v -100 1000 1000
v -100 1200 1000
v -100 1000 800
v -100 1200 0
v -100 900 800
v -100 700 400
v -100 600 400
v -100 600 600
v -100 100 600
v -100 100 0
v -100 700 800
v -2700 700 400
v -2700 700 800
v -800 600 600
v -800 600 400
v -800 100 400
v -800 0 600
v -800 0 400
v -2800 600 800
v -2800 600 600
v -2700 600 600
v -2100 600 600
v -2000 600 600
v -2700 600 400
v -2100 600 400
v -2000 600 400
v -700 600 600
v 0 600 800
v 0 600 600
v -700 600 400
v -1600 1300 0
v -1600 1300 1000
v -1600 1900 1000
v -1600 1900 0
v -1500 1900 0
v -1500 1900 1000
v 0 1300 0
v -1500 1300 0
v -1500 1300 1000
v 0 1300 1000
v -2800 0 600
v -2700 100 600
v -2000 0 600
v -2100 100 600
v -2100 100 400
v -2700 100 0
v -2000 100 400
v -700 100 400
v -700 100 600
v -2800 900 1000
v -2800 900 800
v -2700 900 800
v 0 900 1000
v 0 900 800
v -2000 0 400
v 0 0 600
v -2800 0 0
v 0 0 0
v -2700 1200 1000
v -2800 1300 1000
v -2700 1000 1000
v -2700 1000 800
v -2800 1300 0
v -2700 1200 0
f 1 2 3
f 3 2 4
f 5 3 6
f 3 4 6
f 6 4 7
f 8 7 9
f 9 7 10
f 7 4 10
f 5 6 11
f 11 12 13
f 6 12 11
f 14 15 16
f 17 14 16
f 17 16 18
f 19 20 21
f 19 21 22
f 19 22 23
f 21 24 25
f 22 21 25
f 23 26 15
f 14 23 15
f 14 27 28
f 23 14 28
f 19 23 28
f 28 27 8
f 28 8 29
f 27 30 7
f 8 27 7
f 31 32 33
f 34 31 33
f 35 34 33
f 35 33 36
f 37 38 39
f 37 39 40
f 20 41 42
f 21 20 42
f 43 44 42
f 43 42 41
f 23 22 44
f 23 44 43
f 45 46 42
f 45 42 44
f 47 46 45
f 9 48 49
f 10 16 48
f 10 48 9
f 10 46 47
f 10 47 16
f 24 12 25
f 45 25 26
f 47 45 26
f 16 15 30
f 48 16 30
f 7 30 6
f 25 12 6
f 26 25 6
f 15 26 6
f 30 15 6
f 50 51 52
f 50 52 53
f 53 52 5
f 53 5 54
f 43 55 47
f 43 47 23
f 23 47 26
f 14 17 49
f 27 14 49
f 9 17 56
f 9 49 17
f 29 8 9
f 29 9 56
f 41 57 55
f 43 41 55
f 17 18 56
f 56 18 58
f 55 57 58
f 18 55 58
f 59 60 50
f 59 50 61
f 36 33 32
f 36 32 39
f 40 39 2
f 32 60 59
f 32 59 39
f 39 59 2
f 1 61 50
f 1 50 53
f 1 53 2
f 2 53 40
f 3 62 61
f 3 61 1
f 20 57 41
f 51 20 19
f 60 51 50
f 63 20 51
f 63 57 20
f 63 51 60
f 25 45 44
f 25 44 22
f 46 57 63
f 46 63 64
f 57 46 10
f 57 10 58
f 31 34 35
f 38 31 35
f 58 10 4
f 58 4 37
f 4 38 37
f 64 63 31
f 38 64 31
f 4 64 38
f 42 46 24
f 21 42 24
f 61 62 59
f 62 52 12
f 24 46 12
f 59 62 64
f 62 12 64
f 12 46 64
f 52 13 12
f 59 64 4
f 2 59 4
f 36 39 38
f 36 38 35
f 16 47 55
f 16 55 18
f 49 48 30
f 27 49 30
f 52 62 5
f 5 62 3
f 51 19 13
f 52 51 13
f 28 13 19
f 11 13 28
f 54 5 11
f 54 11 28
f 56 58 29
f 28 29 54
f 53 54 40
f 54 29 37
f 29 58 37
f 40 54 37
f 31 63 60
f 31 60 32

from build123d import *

# Parameters (mm, degrees)
F0_W     = 2800
F0_H     = 1300
F0_W_2   = 2600
F0_H_2   = 1100
F1_DEPTH = 400
F2_W     = 2800
F2_H     = 700
F2_W_2   = 2600
F2_H_2   = 500
F3_DEPTH = 400
F4_W     = 2800
F4_H     = 400
F4_W_2   = 2600
F4_H_2   = 200
F5_DEPTH = 200
F6_W     = 100
F6_H     = 600
F7_DEPTH = 1000
F8_W     = 100
F8_H     = 500
F8_H_2   = 100
F8_W_2   = 600
F9_DEPTH = 200


with BuildPart() as f1:
    # F0 (on Top) → F1 (new body)
    with BuildSketch(Plane.XY):
        with Locations((-1400, 650)):
            Rectangle(F0_W, F0_H)
        with Locations((-1400, 650)):
            Rectangle(F0_W_2, F0_H_2, mode=Mode.SUBTRACT)
    extrude(amount=F1_DEPTH)

    # F2 (on face) → F3 (join)
    with BuildSketch(Plane.XY.offset(400)):
        with Locations((-1400, 950)):
            Rectangle(F2_W, F2_H)
        with Locations((-1400, 950)):
            Rectangle(F2_W_2, F2_H_2, mode=Mode.SUBTRACT)
    extrude(amount=F3_DEPTH)

    # F4 (on face) → F5 (join)
    with BuildSketch(Plane.XY.offset(800)):
        with Locations((-1400, 1100)):
            Rectangle(F4_W, F4_H)
        with Locations((-1400, 1100)):
            Rectangle(F4_W_2, F4_H_2, mode=Mode.SUBTRACT)
    extrude(amount=F5_DEPTH)

    # F6 (on Top) → F7 (join)
    with BuildSketch(Plane.XY):
        with Locations((-1550, 1600)):
            Rectangle(F6_W, F6_H)
    extrude(amount=F7_DEPTH)

    # F8 (on face) → F9 (join)
    with BuildSketch(Plane.XY.offset(400)):
        with Locations((-750, 350)):
            Rectangle(F8_W, F8_H)
        with Locations((-750, 50)):
            Rectangle(F8_W, F8_H_2)
        with Locations((-400, 50)):
            Rectangle(F8_W_2, F8_H_2)
        Polygon((-100, 100), (-100, 0), (0, 0), (0, 500), (0, 600), (-100, 600), align=None)
        with Locations((-2050, 350)):
            Rectangle(F8_W, F8_H)
        Polygon((-2800, 600), (-2800, 0), (-2000, 0), (-2000, 100), (-2100, 100), (-2700, 100), (-2700, 600), align=None)
    extrude(amount=F9_DEPTH)


solid = f1.part
